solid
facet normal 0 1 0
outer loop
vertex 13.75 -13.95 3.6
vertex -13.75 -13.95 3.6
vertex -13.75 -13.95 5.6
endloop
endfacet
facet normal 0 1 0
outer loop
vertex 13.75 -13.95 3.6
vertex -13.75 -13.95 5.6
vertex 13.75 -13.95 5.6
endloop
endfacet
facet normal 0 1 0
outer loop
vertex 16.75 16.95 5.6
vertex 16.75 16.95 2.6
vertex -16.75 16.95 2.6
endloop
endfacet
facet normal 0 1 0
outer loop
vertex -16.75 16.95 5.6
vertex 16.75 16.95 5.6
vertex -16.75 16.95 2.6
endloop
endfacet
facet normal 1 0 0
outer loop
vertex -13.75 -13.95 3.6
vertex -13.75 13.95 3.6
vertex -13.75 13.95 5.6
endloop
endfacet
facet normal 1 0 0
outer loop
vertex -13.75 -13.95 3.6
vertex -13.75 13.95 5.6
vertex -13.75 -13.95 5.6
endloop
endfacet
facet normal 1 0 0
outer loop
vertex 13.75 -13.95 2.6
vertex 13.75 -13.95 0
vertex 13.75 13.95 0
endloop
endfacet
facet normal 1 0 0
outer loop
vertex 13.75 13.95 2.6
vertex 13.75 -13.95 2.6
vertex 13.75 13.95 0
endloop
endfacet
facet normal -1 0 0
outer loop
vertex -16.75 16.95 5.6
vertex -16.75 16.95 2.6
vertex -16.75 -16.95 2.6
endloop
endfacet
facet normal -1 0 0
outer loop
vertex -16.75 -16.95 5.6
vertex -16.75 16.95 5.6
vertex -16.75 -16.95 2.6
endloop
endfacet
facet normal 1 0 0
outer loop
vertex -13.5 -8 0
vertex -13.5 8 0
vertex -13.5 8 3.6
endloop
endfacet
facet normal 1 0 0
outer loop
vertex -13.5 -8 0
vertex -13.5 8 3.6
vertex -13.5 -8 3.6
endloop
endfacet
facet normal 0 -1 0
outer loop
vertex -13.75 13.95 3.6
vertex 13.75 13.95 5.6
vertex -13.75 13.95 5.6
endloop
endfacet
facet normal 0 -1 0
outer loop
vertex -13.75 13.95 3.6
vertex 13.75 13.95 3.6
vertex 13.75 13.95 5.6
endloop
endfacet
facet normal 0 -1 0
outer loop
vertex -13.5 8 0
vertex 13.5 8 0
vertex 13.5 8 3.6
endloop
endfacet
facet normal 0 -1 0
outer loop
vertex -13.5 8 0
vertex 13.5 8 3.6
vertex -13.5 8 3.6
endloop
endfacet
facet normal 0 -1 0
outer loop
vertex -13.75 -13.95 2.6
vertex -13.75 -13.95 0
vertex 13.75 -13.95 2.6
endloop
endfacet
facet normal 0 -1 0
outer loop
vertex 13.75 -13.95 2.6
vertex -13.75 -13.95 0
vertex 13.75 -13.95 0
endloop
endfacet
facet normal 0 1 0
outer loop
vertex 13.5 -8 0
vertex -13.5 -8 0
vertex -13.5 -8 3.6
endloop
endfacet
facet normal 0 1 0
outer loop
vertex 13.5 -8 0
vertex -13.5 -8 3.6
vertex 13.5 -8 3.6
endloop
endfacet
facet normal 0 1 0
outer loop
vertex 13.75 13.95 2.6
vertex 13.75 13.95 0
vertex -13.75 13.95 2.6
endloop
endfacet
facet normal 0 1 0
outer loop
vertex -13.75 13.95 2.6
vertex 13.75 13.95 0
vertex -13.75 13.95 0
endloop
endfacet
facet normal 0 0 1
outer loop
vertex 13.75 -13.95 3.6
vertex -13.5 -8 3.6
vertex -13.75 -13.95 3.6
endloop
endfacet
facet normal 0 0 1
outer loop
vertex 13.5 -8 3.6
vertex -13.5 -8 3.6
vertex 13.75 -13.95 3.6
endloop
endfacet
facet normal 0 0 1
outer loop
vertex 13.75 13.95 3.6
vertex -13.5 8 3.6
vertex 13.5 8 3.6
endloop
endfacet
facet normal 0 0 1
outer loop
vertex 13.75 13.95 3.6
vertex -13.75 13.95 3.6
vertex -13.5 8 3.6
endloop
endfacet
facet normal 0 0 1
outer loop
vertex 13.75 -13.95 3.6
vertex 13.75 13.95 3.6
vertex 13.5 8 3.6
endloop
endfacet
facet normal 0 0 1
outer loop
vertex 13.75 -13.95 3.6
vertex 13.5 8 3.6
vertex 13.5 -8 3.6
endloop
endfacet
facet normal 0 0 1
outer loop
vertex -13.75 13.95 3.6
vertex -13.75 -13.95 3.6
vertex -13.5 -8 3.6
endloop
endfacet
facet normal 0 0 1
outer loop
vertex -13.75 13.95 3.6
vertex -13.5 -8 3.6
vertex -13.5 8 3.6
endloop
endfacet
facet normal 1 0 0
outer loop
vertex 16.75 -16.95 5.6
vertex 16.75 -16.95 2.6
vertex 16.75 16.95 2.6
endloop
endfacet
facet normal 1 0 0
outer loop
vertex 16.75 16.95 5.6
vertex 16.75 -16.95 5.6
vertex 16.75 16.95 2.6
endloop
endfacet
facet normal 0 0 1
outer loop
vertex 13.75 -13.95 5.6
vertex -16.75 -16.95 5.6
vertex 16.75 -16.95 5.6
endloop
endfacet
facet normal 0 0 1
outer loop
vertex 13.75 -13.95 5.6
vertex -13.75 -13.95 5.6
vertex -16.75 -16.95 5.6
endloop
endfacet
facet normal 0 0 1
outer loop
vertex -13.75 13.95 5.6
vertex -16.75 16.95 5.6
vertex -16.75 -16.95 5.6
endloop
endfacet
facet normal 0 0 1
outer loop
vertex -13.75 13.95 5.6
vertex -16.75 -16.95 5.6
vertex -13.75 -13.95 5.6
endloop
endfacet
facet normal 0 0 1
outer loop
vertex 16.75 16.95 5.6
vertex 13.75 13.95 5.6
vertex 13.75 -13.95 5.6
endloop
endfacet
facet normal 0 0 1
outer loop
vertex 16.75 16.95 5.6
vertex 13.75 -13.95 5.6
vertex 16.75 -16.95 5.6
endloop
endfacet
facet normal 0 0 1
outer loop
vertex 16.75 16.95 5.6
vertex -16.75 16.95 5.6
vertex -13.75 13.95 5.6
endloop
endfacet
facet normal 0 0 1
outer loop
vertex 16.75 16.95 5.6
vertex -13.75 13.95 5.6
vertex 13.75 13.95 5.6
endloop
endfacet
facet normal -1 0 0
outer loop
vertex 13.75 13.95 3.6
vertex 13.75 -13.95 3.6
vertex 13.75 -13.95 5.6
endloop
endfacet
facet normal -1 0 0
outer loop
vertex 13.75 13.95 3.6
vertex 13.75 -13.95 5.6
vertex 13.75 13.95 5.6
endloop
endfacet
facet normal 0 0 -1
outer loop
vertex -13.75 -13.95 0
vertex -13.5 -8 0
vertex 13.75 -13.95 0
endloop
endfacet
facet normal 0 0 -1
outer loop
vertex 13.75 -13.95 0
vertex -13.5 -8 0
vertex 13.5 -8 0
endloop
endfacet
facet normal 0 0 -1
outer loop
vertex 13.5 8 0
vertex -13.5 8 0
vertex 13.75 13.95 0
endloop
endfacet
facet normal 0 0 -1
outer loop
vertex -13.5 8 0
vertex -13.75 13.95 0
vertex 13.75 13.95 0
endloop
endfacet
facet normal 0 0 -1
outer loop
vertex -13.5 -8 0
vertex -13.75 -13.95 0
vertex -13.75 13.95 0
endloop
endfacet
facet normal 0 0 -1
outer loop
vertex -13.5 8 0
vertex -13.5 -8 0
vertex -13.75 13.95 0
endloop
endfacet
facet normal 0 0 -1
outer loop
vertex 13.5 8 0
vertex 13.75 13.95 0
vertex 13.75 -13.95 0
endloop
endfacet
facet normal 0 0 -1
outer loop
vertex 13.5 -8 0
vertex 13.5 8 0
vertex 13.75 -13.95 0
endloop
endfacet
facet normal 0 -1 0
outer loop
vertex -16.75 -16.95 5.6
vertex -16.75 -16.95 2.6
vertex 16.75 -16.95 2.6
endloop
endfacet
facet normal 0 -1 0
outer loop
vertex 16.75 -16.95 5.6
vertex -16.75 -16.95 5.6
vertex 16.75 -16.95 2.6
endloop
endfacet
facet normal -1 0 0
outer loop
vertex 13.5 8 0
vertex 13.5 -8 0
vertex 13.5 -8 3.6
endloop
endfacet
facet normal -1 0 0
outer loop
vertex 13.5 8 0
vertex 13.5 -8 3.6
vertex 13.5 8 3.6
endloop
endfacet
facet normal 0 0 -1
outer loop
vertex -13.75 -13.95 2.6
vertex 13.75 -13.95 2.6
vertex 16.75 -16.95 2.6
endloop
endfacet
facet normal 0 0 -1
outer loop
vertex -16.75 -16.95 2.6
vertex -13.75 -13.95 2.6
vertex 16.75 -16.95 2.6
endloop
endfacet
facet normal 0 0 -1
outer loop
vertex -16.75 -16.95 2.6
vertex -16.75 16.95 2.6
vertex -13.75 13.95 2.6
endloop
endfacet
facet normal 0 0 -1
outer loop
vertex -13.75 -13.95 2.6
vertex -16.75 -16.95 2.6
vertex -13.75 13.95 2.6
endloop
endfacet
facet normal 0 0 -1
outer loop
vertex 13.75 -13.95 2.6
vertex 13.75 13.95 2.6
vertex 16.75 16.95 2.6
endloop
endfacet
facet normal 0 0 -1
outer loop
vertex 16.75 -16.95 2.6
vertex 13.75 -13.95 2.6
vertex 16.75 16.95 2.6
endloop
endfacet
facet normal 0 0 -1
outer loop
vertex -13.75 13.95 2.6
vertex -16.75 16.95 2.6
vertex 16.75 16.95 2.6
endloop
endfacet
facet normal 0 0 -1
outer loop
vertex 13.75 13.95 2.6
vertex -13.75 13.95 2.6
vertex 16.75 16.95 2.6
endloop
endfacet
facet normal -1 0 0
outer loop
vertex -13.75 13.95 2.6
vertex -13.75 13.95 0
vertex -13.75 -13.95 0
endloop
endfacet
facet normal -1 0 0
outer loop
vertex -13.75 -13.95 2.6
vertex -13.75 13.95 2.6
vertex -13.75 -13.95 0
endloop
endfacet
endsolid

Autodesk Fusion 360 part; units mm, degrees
sketch "Esquisse1" plane through (0, 0, 0) normal (0, 0, 1) x (1, 0, 0)
  line L0 (13.5, 8) -> (-13.5, 8)
  line L1 (-13.5, 8) -> (-13.5, -8)
  line L2 (-13.5, -8) -> (13.5, -8)
  line L3 (13.5, -8) -> (13.5, 8)
  line L4 (13.5, 8) -> (-13.5, -8) construction
  line L5 (-13.5, 8) -> (13.5, -8) construction
  line L6 (13.75, 13.95) -> (-13.75, 13.95)
  line L7 (-13.75, 13.95) -> (-13.75, -13.95)
  line L8 (-13.75, -13.95) -> (13.75, -13.95)
  line L9 (13.75, -13.95) -> (13.75, 13.95)
  line L10 (13.75, 13.95) -> (-13.75, -13.95) construction
  line L11 (-13.75, 13.95) -> (13.75, -13.95) construction
  line L12 (-16.75, -16.95) -> (16.75, -16.95)
  line L13 (16.75, -16.95) -> (16.75, 16.95)
  line L14 (16.75, 16.95) -> (-16.75, 16.95)
  line L15 (-16.75, 16.95) -> (-16.75, -16.95)
  dimension "d1" = 27
  dimension "d2" = 16
  dimension "d3" = 27.5
  dimension "d4" = 27.9
  dimension "d5" = 3
extrude "Extrusion1" add sketch "Esquisse1" along normal blind 3.6 contours L6 L7 L8 L9
extrude "Extrusion2" add sketch "Esquisse1" along normal blind 5.6 contours L12 L13 L14 L15
extrude "Extrusion3" cut sketch "Esquisse1" along normal blind 2.6 contours L12 L13 L14 L15
equation "d6 = 2.6 mm + 1 mm"
equation "d8 = 2.6 mm + 3 mm"
